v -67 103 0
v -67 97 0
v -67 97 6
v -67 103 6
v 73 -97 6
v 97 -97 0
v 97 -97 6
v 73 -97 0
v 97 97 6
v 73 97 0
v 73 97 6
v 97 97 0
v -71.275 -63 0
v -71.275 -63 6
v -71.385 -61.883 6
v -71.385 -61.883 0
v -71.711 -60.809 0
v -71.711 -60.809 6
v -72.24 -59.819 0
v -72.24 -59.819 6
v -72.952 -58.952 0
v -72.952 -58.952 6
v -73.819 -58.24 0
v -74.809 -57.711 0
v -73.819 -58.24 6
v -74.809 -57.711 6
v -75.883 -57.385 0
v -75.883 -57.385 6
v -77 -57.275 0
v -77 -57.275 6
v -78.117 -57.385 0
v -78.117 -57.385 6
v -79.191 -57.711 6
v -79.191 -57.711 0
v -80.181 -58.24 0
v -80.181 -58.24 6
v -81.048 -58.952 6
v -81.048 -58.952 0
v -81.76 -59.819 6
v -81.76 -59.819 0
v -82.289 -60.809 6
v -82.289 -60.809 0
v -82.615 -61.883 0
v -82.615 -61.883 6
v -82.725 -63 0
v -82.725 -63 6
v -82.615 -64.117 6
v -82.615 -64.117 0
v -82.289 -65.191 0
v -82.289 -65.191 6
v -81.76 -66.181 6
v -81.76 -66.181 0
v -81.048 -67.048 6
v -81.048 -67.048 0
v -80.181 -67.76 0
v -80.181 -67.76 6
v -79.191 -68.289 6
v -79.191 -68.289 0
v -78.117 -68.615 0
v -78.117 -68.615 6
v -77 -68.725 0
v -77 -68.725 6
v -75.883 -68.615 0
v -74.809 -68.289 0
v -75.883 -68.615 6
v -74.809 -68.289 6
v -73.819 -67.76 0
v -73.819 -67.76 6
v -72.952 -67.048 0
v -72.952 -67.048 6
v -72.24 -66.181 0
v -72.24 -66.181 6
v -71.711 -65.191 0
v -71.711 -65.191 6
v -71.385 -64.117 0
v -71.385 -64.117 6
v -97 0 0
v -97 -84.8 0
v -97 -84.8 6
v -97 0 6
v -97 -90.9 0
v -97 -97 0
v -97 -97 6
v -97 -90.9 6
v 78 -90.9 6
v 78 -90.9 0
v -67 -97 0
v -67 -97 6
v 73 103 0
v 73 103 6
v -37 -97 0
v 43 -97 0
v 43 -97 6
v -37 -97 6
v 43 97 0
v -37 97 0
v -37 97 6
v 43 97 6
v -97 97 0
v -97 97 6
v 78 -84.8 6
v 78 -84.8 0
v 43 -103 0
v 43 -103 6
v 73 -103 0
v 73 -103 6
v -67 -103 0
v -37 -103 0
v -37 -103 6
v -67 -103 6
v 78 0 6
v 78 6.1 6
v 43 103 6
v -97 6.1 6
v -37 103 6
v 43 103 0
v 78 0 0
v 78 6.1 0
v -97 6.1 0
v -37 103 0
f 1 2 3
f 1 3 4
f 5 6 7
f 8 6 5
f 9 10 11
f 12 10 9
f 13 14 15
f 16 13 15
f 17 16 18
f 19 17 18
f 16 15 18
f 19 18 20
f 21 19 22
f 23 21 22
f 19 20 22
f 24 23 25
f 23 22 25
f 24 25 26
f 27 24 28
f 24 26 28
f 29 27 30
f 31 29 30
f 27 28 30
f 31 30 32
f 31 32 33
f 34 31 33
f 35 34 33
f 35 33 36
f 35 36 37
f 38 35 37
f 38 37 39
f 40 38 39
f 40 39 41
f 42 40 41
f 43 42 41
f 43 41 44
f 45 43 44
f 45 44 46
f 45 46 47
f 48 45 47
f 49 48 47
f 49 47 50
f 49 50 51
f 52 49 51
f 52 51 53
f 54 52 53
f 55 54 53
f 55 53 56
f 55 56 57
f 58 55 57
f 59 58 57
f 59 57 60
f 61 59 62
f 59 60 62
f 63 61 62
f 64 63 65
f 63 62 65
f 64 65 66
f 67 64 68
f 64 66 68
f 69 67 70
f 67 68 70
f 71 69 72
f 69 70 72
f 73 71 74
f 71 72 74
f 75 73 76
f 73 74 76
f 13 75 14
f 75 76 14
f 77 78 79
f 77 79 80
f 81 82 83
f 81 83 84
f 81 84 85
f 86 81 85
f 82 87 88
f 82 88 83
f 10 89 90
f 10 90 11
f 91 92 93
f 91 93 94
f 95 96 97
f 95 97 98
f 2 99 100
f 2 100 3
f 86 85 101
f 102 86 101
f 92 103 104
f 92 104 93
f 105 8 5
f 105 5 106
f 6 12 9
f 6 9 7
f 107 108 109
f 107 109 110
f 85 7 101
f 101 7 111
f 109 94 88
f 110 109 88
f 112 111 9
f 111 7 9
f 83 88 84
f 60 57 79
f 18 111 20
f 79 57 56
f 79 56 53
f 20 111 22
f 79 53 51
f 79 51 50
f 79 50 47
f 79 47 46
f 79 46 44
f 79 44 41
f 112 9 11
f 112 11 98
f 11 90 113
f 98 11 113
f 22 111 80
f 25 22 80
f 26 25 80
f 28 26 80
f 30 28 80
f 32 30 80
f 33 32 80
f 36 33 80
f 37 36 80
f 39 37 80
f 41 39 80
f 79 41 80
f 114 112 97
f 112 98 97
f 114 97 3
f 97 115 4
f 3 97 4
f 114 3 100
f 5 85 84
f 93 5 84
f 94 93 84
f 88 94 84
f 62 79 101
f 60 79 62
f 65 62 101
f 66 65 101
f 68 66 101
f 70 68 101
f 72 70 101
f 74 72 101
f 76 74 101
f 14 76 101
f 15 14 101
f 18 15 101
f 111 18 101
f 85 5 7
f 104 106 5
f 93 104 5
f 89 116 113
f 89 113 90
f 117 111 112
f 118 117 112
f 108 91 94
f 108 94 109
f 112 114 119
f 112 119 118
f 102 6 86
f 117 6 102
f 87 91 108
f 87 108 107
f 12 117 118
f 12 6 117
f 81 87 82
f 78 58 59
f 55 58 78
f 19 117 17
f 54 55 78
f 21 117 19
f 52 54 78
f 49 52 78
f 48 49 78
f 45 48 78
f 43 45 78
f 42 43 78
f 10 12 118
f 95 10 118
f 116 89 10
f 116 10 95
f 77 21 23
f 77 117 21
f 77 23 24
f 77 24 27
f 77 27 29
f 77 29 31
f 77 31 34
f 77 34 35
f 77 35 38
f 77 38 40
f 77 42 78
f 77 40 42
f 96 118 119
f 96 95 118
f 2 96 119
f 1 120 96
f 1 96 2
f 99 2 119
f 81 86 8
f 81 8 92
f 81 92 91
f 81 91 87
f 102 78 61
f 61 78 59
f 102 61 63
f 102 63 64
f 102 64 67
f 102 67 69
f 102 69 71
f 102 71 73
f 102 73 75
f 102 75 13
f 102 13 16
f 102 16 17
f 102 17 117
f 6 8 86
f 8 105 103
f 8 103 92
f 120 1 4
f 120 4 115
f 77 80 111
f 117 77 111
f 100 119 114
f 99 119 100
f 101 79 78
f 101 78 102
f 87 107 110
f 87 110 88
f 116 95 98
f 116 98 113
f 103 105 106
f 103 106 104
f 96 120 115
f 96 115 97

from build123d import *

# Parameters (mm, degrees)
RESSALTO_EXTRUS_O1_DEPTH = 6
ESBO_O2_W                = 175
ESBO_O2_H                = 6.1
CORTE_EXTRUS_O1_DEPTH    = 10
ESBO_O3_R                = 5.725
CORTE_EXTRUS_O2_DEPTH    = 10


with BuildPart() as part:
    # Esboço1 → Ressalto-extrusão1 (new body)
    with BuildSketch(Plane.XY):
        Polygon((-67, -97), (-97, -97), (-97, 97), (-67, 97), (-67, 103), (-37, 103), (-37, 97), (43, 97), (43, 103), (73, 103), (73, 97), (97, 97), (97, -97), (73, -97), (73, -103), (43, -103), (43, -97), (-37, -97), (-37, -103), (-67, -103), align=None)
    extrude(amount=RESSALTO_EXTRUS_O1_DEPTH)

    # Esboço2 → Corte-extrusão1 (cut)
    with BuildSketch(Plane.XY.offset(6)):
        with Locations((-9.5, 3.05)):
            Rectangle(ESBO_O2_W, ESBO_O2_H)
        with Locations((-9.5, -87.85)):
            Rectangle(ESBO_O2_W, ESBO_O2_H)
    extrude(amount=-CORTE_EXTRUS_O1_DEPTH, mode=Mode.SUBTRACT)

    # Esboço3 → Corte-extrusão2 (cut)
    with BuildSketch(Plane.XY.offset(6)):
        with Locations((-77, -63)):
            Circle(ESBO_O3_R)
    extrude(amount=-CORTE_EXTRUS_O2_DEPTH, mode=Mode.SUBTRACT)


solid = part.part
